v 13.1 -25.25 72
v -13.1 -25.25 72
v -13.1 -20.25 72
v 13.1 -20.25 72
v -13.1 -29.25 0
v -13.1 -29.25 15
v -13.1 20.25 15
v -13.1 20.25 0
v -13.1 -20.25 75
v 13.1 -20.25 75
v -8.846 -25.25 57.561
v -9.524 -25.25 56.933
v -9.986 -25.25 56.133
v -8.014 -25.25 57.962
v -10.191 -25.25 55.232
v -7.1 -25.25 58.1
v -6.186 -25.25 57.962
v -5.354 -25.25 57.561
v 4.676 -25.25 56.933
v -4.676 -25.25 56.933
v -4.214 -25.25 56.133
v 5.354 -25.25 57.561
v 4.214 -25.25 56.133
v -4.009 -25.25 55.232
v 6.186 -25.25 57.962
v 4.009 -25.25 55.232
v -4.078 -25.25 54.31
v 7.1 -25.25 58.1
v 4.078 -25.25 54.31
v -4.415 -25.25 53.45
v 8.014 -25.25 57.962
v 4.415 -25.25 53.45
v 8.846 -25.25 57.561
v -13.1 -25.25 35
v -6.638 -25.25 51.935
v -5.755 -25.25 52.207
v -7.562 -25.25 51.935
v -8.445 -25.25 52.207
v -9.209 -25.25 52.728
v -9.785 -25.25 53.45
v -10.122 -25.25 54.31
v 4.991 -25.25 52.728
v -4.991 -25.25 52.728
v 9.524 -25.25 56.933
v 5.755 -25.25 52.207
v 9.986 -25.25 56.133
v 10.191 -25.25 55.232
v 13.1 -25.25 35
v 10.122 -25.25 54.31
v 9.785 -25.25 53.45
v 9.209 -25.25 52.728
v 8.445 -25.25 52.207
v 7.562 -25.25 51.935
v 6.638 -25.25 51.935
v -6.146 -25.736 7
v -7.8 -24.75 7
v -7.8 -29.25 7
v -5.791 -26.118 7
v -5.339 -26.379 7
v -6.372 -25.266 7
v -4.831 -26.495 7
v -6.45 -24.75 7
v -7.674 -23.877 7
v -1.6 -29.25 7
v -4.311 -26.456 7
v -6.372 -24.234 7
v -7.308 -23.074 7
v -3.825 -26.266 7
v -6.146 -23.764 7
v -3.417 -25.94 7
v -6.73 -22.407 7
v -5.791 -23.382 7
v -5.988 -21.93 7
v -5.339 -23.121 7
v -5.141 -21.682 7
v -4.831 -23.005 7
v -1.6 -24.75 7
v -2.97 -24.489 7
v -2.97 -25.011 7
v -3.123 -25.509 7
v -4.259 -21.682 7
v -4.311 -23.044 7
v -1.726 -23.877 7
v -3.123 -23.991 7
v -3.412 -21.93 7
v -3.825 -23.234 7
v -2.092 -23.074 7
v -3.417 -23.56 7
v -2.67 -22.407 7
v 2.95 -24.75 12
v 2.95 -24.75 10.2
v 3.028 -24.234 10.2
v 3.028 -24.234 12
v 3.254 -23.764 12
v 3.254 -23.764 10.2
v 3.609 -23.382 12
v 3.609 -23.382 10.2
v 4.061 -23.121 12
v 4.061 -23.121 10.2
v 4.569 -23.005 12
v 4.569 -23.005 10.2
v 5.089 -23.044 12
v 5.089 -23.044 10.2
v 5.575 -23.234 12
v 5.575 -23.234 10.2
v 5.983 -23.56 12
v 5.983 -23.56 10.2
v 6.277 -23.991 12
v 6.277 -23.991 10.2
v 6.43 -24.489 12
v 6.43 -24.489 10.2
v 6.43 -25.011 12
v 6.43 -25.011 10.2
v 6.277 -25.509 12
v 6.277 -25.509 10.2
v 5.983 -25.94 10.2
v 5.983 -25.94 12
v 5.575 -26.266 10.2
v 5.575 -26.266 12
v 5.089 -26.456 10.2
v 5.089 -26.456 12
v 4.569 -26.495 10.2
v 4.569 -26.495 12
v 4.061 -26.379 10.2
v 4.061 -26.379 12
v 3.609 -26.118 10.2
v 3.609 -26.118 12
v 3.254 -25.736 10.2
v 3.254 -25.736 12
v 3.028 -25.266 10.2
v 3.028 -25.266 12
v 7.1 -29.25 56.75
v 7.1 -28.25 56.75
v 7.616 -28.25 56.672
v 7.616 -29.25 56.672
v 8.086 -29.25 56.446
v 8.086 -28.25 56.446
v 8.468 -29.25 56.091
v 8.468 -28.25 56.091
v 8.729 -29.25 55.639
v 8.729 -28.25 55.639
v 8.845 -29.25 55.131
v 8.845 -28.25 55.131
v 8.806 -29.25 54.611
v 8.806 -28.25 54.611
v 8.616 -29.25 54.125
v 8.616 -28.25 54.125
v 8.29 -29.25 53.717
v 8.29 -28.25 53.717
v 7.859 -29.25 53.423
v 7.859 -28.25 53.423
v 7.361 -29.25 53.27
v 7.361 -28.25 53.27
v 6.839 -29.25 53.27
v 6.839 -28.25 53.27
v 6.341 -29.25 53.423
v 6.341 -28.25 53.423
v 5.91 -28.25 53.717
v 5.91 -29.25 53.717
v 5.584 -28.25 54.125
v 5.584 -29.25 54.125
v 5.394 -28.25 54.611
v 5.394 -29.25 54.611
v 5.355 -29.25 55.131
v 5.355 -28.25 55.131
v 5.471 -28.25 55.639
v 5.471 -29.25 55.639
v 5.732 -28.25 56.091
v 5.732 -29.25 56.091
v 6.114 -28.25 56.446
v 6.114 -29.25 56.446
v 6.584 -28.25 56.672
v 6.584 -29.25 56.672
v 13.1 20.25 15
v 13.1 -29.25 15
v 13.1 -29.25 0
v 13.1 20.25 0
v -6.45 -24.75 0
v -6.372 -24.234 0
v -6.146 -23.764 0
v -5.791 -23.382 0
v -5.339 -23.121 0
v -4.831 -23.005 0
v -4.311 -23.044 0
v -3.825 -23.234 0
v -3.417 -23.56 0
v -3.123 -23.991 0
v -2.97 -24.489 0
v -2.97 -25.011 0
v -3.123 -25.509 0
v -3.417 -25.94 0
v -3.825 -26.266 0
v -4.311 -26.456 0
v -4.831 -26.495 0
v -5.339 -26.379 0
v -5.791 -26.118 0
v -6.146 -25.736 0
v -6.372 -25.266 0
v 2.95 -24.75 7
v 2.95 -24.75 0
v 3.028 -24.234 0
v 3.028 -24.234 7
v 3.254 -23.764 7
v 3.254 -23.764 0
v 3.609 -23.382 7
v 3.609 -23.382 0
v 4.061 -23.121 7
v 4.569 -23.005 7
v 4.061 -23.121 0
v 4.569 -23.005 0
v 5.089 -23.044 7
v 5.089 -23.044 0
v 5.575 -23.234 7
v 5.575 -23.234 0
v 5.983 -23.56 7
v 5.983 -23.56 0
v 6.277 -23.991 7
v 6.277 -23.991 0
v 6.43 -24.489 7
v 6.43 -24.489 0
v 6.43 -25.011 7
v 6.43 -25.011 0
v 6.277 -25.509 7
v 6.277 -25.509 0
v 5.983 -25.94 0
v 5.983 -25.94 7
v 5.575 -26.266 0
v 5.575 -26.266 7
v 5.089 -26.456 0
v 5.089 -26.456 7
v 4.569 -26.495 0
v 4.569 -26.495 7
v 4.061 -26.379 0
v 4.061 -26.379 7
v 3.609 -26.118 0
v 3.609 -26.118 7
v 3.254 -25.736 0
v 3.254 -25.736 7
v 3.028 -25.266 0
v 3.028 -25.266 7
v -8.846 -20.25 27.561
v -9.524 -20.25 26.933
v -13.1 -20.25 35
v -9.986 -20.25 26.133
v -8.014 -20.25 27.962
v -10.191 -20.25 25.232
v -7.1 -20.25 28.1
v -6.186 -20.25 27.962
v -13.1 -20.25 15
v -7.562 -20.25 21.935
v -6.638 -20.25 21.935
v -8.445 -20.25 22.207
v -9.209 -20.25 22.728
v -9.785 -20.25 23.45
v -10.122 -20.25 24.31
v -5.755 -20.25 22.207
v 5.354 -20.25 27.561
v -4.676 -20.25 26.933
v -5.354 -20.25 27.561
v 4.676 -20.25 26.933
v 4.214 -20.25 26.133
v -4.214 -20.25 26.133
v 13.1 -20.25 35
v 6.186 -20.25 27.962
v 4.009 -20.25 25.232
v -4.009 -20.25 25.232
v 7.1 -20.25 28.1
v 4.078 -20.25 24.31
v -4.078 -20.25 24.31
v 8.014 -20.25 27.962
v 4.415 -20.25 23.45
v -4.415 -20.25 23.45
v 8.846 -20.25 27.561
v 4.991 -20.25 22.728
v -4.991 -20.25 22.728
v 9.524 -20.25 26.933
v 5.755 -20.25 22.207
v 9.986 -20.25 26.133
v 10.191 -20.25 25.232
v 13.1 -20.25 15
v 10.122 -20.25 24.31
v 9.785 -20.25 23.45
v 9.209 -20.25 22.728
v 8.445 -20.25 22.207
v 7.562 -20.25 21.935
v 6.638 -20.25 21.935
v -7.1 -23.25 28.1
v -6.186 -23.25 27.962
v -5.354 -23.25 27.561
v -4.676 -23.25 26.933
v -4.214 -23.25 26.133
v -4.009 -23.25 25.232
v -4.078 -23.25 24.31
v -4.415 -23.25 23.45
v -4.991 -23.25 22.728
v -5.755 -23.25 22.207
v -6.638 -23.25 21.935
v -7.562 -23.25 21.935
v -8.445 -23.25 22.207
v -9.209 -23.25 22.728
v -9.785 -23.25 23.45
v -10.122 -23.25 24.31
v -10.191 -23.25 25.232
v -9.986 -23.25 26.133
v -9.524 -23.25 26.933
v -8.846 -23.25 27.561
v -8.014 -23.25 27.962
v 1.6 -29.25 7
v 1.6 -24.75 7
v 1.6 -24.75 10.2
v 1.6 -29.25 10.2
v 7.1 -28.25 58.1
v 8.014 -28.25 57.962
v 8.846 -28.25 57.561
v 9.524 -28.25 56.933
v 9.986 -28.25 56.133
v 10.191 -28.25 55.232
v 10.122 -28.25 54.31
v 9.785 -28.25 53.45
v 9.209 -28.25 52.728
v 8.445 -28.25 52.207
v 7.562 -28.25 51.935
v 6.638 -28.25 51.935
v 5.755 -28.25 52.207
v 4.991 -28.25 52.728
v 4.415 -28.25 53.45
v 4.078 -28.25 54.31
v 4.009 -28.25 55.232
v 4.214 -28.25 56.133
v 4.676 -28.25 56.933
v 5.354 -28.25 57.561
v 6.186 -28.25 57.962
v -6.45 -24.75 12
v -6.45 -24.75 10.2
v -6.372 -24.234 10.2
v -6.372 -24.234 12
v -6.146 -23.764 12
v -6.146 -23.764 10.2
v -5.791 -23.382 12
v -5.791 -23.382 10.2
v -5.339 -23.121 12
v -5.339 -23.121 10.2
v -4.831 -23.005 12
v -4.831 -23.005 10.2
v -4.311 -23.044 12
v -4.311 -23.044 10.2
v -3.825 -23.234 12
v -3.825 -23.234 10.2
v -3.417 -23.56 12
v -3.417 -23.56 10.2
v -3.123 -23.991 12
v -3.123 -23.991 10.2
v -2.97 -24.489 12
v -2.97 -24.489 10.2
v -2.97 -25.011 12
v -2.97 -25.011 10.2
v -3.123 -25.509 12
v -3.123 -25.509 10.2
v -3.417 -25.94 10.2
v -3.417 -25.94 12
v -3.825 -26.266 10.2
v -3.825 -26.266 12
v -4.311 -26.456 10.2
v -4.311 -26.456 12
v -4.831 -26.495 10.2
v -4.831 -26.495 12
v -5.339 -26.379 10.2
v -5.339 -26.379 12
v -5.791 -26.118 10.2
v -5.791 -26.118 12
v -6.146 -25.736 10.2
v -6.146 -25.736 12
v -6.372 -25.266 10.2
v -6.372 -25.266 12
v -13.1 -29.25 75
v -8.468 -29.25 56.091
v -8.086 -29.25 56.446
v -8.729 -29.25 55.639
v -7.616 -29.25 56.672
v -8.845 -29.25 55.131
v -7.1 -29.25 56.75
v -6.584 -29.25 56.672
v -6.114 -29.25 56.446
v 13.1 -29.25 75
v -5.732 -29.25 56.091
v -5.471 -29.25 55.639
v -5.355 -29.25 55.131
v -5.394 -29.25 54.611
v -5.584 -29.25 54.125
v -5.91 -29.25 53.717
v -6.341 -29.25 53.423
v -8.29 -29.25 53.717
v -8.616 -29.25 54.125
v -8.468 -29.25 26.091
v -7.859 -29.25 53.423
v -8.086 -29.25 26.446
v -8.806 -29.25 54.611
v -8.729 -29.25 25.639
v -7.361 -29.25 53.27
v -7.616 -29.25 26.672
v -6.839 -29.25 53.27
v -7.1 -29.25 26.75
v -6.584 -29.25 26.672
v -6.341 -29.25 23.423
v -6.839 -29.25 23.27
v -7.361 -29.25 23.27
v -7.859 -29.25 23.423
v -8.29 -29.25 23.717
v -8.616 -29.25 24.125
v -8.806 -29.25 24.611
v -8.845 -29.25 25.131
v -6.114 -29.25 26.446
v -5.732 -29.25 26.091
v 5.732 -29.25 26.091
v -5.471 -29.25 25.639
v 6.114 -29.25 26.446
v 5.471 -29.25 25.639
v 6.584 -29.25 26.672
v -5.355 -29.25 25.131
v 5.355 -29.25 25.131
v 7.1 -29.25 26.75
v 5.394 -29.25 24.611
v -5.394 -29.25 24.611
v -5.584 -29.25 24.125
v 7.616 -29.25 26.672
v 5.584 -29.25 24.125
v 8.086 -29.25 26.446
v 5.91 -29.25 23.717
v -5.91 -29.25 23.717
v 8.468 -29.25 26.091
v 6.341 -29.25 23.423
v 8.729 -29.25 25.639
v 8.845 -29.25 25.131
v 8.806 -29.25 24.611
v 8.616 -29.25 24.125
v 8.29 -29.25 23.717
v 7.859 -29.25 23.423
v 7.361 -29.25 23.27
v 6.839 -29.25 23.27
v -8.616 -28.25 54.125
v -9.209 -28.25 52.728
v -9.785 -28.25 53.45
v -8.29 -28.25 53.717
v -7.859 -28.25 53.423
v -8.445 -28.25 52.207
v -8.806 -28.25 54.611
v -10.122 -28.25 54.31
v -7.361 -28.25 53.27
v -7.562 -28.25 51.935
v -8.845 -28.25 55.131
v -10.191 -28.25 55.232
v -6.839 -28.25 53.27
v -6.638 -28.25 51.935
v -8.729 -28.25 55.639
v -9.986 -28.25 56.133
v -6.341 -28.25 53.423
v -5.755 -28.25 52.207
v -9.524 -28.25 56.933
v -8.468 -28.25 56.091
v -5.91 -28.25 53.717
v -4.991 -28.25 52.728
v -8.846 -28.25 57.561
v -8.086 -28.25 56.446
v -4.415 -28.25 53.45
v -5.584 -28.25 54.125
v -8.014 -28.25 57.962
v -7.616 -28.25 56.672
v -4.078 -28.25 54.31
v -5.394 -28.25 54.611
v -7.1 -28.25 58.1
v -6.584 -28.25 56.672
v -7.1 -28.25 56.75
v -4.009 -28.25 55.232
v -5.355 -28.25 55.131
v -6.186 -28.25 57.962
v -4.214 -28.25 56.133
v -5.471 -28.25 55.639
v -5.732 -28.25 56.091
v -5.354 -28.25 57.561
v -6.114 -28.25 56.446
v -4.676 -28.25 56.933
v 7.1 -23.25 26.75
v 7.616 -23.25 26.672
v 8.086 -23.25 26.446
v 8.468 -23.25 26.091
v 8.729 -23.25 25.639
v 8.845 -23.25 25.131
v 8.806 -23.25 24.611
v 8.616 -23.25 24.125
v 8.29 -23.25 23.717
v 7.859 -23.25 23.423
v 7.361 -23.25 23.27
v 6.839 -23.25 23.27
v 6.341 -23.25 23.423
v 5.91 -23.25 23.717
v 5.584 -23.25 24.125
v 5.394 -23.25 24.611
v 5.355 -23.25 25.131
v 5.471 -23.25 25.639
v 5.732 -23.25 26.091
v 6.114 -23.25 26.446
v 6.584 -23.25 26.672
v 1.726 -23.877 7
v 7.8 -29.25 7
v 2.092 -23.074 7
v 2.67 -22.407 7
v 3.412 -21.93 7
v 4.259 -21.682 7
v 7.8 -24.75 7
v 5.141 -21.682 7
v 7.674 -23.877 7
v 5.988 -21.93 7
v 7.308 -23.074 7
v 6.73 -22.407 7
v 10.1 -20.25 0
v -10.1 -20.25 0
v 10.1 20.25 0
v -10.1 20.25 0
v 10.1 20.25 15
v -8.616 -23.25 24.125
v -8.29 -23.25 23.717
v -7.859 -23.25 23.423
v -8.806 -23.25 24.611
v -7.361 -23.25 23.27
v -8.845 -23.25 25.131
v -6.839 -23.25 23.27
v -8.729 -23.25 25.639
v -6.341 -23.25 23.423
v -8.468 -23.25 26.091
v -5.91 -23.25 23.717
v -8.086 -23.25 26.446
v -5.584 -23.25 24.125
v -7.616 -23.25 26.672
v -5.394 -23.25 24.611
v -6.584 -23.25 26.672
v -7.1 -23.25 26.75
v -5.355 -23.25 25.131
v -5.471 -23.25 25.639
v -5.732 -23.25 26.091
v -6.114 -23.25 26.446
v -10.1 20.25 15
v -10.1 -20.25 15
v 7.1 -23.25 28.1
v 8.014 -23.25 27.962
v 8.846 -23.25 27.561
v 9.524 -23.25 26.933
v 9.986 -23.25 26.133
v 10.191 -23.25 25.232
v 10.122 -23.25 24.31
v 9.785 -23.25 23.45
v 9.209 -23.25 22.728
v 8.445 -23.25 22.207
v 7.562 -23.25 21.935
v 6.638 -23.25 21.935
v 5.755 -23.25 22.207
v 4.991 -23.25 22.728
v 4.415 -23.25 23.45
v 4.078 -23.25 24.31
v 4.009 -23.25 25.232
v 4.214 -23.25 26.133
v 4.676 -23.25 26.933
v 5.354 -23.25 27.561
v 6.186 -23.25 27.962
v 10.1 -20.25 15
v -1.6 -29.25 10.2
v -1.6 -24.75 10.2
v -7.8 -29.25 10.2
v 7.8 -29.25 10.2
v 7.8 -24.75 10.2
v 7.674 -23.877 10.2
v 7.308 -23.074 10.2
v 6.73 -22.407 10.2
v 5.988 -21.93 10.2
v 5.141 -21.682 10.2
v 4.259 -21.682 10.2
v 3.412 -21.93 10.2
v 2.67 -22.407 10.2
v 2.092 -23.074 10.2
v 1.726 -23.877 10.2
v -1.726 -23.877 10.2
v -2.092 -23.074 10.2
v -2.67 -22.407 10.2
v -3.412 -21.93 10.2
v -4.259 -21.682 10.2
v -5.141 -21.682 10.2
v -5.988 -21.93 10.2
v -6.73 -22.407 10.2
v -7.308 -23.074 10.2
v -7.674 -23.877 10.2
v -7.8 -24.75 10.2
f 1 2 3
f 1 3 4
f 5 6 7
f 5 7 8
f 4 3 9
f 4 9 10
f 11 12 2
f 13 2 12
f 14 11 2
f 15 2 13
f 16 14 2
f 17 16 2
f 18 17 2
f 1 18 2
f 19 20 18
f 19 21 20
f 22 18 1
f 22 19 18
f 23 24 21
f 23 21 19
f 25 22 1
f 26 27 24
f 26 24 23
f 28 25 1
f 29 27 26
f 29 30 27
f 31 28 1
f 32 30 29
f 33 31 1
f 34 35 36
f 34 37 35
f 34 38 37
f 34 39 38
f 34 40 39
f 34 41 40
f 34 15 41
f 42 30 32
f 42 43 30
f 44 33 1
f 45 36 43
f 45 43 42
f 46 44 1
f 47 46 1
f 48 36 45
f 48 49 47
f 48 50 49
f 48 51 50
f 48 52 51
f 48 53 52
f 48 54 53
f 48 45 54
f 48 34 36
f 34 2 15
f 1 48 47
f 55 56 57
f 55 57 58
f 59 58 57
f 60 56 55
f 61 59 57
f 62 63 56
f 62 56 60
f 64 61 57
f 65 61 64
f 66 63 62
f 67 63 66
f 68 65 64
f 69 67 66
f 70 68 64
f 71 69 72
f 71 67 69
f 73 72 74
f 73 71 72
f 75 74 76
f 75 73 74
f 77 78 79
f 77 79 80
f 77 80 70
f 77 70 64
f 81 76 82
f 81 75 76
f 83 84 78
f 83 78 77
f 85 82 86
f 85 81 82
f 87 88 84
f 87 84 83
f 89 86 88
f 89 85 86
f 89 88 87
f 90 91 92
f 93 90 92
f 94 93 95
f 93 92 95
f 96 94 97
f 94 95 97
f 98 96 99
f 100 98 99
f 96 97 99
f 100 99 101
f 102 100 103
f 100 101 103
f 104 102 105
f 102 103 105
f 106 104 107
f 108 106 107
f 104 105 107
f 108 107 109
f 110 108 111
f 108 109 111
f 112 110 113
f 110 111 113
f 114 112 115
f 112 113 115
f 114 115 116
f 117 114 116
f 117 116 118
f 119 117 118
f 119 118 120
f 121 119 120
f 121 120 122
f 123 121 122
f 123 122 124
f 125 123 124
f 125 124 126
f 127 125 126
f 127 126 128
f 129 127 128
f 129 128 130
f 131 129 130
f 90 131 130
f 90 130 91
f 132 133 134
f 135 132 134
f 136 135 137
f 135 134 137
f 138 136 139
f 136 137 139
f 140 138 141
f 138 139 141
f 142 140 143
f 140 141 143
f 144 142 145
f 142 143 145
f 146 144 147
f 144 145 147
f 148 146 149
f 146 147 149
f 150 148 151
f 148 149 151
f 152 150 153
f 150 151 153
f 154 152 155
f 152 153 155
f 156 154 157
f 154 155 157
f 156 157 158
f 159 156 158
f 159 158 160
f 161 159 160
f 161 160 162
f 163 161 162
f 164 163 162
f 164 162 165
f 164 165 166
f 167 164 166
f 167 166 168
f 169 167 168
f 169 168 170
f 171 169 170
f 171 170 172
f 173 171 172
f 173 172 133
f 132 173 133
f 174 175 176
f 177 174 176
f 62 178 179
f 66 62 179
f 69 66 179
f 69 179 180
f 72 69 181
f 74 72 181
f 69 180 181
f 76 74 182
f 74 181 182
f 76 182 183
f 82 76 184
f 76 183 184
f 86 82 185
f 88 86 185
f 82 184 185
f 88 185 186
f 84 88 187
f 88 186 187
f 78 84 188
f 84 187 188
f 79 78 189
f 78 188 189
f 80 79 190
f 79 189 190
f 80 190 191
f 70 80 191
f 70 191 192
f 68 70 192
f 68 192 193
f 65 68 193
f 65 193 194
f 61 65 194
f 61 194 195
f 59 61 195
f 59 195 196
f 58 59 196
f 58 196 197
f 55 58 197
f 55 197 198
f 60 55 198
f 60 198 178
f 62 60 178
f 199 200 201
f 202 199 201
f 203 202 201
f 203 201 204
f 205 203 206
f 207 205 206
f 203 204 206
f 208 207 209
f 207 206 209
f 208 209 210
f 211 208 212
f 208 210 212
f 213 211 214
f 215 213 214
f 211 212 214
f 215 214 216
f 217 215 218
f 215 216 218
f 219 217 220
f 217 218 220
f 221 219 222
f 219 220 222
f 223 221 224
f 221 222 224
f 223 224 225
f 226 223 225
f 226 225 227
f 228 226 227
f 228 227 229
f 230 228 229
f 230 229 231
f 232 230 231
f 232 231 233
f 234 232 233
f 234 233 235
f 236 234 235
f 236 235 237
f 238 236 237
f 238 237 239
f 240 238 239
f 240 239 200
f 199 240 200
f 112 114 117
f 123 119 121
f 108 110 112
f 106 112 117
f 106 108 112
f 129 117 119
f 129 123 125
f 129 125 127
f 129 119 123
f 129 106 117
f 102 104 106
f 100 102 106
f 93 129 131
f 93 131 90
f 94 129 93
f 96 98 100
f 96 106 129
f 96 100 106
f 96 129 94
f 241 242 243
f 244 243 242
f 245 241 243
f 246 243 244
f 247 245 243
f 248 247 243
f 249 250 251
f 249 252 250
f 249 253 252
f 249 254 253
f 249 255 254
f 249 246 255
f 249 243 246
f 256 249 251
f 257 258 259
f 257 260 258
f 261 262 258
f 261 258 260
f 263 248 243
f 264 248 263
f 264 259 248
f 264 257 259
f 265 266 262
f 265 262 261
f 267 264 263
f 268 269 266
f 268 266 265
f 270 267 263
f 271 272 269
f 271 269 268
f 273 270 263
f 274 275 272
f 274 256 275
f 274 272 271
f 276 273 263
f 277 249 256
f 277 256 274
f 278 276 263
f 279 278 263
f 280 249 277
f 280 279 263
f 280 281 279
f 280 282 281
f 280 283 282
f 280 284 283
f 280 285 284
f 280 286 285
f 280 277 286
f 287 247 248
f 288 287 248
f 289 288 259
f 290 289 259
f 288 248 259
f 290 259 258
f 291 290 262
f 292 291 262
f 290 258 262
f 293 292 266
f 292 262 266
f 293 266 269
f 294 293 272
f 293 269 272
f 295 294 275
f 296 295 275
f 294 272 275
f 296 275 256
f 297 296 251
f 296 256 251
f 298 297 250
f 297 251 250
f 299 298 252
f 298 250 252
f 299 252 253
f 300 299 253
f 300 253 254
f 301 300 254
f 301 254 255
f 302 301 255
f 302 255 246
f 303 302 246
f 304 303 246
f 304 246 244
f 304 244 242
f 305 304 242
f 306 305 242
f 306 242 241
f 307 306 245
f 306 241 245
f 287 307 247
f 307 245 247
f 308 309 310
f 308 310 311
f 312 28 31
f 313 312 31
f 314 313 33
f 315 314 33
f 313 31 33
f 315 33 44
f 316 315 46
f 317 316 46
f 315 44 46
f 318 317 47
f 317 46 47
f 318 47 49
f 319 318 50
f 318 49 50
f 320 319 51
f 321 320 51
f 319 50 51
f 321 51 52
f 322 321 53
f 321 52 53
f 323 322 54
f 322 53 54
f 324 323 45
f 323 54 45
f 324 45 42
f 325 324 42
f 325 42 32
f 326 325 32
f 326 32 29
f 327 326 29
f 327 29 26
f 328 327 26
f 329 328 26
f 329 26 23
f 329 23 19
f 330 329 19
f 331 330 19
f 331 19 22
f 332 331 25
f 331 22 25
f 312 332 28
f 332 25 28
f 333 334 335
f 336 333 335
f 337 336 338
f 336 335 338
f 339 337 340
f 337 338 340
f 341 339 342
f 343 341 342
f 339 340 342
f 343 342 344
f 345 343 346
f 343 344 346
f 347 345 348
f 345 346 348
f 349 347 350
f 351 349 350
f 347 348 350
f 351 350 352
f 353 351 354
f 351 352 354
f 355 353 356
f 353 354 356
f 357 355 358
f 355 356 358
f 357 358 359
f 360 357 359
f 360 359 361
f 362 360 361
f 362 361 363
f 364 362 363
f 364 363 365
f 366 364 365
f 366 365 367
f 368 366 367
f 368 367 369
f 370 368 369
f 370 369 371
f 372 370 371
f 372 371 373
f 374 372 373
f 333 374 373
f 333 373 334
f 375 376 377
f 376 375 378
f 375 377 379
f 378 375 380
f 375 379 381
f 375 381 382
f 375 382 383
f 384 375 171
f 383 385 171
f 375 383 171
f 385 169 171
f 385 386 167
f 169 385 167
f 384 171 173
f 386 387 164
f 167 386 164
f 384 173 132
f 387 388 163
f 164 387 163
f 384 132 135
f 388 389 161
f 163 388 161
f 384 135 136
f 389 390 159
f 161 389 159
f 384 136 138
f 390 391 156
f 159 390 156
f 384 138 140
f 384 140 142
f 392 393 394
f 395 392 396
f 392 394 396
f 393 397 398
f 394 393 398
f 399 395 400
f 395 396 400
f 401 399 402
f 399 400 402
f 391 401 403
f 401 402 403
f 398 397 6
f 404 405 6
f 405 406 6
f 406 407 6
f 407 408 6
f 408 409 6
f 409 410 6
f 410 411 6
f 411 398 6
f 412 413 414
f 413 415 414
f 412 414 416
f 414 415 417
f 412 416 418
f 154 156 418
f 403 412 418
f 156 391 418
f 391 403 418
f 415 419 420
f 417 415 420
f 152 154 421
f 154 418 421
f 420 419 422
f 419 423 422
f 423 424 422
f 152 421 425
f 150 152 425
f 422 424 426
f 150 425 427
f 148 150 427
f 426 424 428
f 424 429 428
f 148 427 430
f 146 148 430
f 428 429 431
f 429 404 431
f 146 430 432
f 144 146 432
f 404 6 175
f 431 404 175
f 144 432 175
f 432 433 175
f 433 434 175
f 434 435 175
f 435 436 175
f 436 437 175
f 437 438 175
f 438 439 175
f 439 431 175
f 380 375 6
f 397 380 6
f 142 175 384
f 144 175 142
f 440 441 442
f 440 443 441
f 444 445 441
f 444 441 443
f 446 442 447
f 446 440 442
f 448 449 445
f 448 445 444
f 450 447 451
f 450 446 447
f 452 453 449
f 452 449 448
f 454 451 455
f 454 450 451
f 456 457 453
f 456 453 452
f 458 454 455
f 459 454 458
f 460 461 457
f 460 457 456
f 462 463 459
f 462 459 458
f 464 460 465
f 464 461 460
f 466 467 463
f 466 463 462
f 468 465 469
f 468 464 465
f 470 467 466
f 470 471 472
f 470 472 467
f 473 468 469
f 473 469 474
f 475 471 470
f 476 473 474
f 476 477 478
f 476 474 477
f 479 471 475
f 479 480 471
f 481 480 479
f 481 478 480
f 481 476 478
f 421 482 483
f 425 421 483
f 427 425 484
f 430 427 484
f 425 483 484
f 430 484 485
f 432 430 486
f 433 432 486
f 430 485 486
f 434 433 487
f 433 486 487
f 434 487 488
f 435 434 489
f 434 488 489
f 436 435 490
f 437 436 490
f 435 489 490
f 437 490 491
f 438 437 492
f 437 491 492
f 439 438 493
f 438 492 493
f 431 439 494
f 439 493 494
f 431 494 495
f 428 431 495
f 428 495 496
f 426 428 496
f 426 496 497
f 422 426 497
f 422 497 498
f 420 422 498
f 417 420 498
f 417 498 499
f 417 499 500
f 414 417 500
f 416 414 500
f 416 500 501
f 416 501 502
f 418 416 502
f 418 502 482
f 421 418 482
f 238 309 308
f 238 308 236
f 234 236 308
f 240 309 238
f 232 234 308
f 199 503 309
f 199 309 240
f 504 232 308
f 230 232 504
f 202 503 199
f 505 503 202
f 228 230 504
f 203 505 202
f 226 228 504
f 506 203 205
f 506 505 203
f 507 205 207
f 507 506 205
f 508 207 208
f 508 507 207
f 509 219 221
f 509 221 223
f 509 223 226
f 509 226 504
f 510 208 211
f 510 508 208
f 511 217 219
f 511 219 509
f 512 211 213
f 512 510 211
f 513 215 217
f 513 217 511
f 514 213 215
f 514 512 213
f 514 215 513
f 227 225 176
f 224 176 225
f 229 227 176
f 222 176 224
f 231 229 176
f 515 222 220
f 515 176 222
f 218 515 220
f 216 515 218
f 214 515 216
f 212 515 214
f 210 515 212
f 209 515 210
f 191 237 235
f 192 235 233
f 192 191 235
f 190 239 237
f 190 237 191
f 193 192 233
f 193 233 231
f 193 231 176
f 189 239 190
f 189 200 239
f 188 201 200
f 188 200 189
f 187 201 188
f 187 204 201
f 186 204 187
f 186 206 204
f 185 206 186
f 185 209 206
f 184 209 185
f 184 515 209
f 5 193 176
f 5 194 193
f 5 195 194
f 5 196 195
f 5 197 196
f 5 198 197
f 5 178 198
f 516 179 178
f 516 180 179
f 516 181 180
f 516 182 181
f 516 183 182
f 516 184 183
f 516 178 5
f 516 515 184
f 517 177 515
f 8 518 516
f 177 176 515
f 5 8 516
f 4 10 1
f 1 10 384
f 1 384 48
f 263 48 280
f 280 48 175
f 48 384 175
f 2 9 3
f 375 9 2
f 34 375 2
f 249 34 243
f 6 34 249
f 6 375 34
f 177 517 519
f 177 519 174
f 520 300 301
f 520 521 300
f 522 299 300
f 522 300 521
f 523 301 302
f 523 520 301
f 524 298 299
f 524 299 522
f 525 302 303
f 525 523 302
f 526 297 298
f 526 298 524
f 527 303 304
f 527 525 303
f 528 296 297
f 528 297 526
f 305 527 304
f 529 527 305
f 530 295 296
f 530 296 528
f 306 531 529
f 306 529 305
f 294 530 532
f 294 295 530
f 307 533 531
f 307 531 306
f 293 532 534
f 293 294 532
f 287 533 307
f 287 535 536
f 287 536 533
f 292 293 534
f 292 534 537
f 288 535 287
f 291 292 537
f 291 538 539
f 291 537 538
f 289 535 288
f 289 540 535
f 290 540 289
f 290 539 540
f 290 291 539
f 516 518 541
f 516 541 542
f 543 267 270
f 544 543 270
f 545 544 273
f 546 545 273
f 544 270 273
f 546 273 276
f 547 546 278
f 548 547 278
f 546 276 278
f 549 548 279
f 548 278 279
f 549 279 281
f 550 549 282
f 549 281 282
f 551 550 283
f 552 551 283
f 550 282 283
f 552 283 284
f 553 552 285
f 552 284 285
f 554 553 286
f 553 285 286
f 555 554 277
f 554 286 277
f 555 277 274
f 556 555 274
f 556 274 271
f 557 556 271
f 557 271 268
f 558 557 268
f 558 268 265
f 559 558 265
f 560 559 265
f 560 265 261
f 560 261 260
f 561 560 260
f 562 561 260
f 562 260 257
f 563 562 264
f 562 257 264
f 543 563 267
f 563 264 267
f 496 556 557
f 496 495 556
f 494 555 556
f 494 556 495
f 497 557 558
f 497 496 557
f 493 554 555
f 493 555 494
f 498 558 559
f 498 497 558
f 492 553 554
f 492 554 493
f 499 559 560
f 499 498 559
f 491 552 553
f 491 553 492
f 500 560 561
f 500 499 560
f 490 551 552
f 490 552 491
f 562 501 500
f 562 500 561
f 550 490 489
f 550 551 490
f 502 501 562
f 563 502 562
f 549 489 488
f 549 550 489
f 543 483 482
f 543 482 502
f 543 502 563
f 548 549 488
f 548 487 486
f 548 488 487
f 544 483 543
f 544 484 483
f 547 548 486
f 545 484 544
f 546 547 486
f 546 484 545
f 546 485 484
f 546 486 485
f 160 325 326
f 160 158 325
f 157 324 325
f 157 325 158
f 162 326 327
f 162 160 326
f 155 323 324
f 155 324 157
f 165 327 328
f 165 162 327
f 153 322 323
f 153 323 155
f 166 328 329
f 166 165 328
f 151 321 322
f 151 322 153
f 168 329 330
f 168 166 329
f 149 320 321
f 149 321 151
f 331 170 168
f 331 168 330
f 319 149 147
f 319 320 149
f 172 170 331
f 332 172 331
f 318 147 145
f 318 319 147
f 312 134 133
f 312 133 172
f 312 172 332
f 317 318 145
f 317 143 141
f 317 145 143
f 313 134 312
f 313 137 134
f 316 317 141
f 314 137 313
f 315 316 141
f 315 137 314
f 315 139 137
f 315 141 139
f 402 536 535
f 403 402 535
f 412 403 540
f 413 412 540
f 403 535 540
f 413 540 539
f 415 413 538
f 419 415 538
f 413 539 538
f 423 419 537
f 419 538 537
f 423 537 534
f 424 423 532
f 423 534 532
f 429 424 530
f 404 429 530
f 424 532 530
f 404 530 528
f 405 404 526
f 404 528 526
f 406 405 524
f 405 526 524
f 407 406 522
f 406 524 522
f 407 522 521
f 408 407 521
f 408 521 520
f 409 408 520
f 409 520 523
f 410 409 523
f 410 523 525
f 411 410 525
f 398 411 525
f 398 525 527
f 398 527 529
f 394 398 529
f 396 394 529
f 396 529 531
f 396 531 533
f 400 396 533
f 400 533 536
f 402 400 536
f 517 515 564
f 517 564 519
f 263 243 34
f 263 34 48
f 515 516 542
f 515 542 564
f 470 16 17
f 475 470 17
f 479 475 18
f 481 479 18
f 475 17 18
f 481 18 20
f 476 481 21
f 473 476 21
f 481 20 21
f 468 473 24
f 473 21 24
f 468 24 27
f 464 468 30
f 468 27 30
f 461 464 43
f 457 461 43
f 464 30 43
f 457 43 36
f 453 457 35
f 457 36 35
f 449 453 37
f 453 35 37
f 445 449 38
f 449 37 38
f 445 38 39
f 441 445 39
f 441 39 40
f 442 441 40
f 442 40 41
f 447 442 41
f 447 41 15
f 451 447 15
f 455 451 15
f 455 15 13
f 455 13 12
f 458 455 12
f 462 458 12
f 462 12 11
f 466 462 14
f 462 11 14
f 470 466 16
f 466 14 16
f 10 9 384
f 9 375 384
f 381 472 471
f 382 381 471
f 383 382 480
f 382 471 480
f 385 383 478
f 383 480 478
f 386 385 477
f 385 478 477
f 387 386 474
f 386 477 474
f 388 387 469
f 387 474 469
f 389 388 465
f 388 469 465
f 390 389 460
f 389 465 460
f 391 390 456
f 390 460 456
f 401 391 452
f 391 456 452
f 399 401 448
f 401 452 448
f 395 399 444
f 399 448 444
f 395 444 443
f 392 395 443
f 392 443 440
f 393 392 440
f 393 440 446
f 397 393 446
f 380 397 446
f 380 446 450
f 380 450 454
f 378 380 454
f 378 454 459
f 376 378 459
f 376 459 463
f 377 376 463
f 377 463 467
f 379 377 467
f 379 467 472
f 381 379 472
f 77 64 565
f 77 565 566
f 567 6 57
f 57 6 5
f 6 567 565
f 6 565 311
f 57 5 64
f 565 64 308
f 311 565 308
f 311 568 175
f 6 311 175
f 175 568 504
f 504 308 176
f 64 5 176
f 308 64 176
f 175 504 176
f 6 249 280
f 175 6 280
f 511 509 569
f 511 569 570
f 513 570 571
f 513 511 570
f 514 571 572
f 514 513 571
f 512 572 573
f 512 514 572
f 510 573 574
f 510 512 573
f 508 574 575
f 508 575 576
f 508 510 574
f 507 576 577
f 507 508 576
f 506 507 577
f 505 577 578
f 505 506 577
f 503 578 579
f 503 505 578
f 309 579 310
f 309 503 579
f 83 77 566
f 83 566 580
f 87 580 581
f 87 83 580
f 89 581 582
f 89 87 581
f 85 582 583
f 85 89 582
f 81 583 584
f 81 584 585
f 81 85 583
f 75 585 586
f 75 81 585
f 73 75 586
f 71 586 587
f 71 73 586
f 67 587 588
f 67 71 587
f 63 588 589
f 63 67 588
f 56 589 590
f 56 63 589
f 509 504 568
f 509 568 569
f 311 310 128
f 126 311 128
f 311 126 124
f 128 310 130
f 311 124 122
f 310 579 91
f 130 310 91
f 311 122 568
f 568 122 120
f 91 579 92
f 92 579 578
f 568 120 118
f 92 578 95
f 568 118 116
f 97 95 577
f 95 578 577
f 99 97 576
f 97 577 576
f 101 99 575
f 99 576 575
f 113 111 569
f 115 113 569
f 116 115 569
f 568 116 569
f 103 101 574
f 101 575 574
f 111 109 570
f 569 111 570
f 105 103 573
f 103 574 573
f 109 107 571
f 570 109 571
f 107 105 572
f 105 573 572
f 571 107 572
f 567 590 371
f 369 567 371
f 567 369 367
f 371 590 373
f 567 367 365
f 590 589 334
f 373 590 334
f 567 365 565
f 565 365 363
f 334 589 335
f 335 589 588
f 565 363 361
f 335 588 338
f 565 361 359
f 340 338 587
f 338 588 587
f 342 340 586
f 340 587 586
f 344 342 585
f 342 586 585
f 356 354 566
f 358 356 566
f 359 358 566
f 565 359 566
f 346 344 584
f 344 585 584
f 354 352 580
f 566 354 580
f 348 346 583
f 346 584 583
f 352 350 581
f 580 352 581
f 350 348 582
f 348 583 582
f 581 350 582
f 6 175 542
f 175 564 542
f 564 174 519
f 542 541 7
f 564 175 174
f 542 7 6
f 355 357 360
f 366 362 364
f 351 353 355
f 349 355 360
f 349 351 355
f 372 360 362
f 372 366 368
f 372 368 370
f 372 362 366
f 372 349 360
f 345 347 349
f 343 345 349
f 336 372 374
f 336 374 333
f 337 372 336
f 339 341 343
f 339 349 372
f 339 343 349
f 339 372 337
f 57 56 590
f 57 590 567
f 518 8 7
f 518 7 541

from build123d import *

# Parameters (mm, degrees)
SALIENTE_EXTRUIR1_DEPTH = 15
CROQUIS3_R              = 1.75
CORTAR_EXTRUIR1_DEPTH   = 12
CORTAR_EXTRUIR2_DEPTH   = 3.2
CROQUIS6_W              = 26.2
CROQUIS6_H              = 9
SALIENTE_EXTRUIR2_DEPTH = 20
CROQUIS8_W              = 26.2
CROQUIS8_H              = 4
SALIENTE_EXTRUIR4_DEPTH = 40
CROQUIS9_W              = 26.2
CROQUIS9_H              = 3
SALIENTE_EXTRUIR5_DEPTH = 5
CROQUIS10_R             = 1.75
CORTAR_EXTRUIR3_DEPTH   = 87.237230939
CROQUIS11_R             = 3.1
CORTAR_EXTRUIR4_DEPTH   = 3
CROQUIS12_R             = 3.1
CORTAR_EXTRUIR5_DEPTH   = 3


with BuildPart() as part:
    # Croquis1 → Saliente-Extruir1 (new body)
    with BuildSketch(Plane.XY):
        Polygon((-13.1, 20.25), (-10.1, 20.25), (-10.1, -20.25), (10.1, -20.25), (10.1, 20.25), (13.1, 20.25), (13.1, -29.25), (-13.1, -29.25), align=None)
    extrude(amount=SALIENTE_EXTRUIR1_DEPTH)

    # Croquis3 → Cortar-Extruir1 (cut)
    with BuildSketch(Plane(origin=(0, 0, 0), x_dir=(-1, 0, 0), z_dir=(0, 0, -1))):
        with Locations((4.7, 25.25)):
            Circle(CROQUIS3_R)
        with Locations((-4.7, 25.25)):
            Circle(CROQUIS3_R)
        with Locations((4.7, -24.75)):
            Circle(CROQUIS3_R)
        with Locations((-4.7, -24.75)):
            Circle(CROQUIS3_R)
    extrude(amount=-CORTAR_EXTRUIR1_DEPTH, mode=Mode.SUBTRACT)

    # Croquis4 → Cortar-Extruir2 (cut)
    with BuildSketch(Plane(origin=(0, 0, 7), x_dir=(-1, 0, 0), z_dir=(0, 0, -1))):
        with BuildLine():
            Line((7.8, -24.75), (7.8, -29.25))
            Line((7.8, -29.25), (1.6, -29.25))
            Line((1.6, -29.25), (1.6, -24.75))
            ThreePointArc((1.6, -24.75), (4.7, -21.65), (7.8, -24.75))
        make_face()
        with BuildLine():
            Line((-1.6, -24.75), (-1.6, -29.25))
            Line((-1.6, -29.25), (-7.8, -29.25))
            Line((-7.8, -29.25), (-7.8, -24.75))
            ThreePointArc((-7.8, -24.75), (-4.7, -21.65), (-1.6, -24.75))
        make_face()
    extrude(amount=-CORTAR_EXTRUIR2_DEPTH, mode=Mode.SUBTRACT)

    # Croquis6 → Saliente-Extruir2 (add)
    with BuildSketch(Plane.XY.offset(15)):
        with Locations((0, -24.75)):
            Rectangle(CROQUIS6_W, CROQUIS6_H)
    extrude(amount=SALIENTE_EXTRUIR2_DEPTH)

    # Croquis8 → Saliente-Extruir4 (add)
    with BuildSketch(Plane.XY.offset(35)):
        with Locations((0, -27.25)):
            Rectangle(CROQUIS8_W, CROQUIS8_H)
    extrude(amount=SALIENTE_EXTRUIR4_DEPTH)

    # Croquis9 → Saliente-Extruir5 (add)
    with BuildSketch(Plane(origin=(0, -25.25, 0), x_dir=(1, 0, 0), z_dir=(0, 1, 0))):
        with Locations((0, -73.5)):
            Rectangle(CROQUIS9_W, CROQUIS9_H)
    extrude(amount=SALIENTE_EXTRUIR5_DEPTH)

    # Croquis10 → Cortar-Extruir3 (cut, through all)
    with BuildSketch(Plane(origin=(0, -20.25, 0), x_dir=(1, 0, 0), z_dir=(0, 1, 0))):
        with Locations((-7.1, -25)):
            Circle(CROQUIS10_R)
        with Locations((7.1, -25)):
            Circle(CROQUIS10_R)
        with Locations((-7.1, -55)):
            Circle(CROQUIS10_R)
        with Locations((7.1, -55)):
            Circle(CROQUIS10_R)
    extrude(amount=-CORTAR_EXTRUIR3_DEPTH, mode=Mode.SUBTRACT)

    # Croquis11 → Cortar-Extruir4 (cut)
    with BuildSketch(Plane(origin=(0, -20.25, 0), x_dir=(1, 0, 0), z_dir=(0, 1, 0))):
        with Locations((-7.1, -25)):
            Circle(CROQUIS11_R)
        with Locations((7.1, -25)):
            Circle(CROQUIS11_R)
    extrude(amount=-CORTAR_EXTRUIR4_DEPTH, mode=Mode.SUBTRACT)

    # Croquis12 → Cortar-Extruir5 (cut)
    with BuildSketch(Plane(origin=(0, -25.25, 0), x_dir=(1, 0, 0), z_dir=(0, 1, 0))):
        with Locations((-7.1, -55)):
            Circle(CROQUIS12_R)
        with Locations((7.1, -55)):
            Circle(CROQUIS12_R)
    extrude(amount=-CORTAR_EXTRUIR5_DEPTH, mode=Mode.SUBTRACT)


with BuildPart() as body_2:
    # Partir1: the piece on the far side of the plane
    add(part.part)
    split(bisect_by=Plane.XY.offset(15), keep=Keep.BOTTOM)


with BuildPart() as part_1:
    add(part.part)

    # Partir1
    split(bisect_by=Plane.XY.offset(15), keep=Keep.TOP)


solid = Compound([body_2.part, part_1.part])
